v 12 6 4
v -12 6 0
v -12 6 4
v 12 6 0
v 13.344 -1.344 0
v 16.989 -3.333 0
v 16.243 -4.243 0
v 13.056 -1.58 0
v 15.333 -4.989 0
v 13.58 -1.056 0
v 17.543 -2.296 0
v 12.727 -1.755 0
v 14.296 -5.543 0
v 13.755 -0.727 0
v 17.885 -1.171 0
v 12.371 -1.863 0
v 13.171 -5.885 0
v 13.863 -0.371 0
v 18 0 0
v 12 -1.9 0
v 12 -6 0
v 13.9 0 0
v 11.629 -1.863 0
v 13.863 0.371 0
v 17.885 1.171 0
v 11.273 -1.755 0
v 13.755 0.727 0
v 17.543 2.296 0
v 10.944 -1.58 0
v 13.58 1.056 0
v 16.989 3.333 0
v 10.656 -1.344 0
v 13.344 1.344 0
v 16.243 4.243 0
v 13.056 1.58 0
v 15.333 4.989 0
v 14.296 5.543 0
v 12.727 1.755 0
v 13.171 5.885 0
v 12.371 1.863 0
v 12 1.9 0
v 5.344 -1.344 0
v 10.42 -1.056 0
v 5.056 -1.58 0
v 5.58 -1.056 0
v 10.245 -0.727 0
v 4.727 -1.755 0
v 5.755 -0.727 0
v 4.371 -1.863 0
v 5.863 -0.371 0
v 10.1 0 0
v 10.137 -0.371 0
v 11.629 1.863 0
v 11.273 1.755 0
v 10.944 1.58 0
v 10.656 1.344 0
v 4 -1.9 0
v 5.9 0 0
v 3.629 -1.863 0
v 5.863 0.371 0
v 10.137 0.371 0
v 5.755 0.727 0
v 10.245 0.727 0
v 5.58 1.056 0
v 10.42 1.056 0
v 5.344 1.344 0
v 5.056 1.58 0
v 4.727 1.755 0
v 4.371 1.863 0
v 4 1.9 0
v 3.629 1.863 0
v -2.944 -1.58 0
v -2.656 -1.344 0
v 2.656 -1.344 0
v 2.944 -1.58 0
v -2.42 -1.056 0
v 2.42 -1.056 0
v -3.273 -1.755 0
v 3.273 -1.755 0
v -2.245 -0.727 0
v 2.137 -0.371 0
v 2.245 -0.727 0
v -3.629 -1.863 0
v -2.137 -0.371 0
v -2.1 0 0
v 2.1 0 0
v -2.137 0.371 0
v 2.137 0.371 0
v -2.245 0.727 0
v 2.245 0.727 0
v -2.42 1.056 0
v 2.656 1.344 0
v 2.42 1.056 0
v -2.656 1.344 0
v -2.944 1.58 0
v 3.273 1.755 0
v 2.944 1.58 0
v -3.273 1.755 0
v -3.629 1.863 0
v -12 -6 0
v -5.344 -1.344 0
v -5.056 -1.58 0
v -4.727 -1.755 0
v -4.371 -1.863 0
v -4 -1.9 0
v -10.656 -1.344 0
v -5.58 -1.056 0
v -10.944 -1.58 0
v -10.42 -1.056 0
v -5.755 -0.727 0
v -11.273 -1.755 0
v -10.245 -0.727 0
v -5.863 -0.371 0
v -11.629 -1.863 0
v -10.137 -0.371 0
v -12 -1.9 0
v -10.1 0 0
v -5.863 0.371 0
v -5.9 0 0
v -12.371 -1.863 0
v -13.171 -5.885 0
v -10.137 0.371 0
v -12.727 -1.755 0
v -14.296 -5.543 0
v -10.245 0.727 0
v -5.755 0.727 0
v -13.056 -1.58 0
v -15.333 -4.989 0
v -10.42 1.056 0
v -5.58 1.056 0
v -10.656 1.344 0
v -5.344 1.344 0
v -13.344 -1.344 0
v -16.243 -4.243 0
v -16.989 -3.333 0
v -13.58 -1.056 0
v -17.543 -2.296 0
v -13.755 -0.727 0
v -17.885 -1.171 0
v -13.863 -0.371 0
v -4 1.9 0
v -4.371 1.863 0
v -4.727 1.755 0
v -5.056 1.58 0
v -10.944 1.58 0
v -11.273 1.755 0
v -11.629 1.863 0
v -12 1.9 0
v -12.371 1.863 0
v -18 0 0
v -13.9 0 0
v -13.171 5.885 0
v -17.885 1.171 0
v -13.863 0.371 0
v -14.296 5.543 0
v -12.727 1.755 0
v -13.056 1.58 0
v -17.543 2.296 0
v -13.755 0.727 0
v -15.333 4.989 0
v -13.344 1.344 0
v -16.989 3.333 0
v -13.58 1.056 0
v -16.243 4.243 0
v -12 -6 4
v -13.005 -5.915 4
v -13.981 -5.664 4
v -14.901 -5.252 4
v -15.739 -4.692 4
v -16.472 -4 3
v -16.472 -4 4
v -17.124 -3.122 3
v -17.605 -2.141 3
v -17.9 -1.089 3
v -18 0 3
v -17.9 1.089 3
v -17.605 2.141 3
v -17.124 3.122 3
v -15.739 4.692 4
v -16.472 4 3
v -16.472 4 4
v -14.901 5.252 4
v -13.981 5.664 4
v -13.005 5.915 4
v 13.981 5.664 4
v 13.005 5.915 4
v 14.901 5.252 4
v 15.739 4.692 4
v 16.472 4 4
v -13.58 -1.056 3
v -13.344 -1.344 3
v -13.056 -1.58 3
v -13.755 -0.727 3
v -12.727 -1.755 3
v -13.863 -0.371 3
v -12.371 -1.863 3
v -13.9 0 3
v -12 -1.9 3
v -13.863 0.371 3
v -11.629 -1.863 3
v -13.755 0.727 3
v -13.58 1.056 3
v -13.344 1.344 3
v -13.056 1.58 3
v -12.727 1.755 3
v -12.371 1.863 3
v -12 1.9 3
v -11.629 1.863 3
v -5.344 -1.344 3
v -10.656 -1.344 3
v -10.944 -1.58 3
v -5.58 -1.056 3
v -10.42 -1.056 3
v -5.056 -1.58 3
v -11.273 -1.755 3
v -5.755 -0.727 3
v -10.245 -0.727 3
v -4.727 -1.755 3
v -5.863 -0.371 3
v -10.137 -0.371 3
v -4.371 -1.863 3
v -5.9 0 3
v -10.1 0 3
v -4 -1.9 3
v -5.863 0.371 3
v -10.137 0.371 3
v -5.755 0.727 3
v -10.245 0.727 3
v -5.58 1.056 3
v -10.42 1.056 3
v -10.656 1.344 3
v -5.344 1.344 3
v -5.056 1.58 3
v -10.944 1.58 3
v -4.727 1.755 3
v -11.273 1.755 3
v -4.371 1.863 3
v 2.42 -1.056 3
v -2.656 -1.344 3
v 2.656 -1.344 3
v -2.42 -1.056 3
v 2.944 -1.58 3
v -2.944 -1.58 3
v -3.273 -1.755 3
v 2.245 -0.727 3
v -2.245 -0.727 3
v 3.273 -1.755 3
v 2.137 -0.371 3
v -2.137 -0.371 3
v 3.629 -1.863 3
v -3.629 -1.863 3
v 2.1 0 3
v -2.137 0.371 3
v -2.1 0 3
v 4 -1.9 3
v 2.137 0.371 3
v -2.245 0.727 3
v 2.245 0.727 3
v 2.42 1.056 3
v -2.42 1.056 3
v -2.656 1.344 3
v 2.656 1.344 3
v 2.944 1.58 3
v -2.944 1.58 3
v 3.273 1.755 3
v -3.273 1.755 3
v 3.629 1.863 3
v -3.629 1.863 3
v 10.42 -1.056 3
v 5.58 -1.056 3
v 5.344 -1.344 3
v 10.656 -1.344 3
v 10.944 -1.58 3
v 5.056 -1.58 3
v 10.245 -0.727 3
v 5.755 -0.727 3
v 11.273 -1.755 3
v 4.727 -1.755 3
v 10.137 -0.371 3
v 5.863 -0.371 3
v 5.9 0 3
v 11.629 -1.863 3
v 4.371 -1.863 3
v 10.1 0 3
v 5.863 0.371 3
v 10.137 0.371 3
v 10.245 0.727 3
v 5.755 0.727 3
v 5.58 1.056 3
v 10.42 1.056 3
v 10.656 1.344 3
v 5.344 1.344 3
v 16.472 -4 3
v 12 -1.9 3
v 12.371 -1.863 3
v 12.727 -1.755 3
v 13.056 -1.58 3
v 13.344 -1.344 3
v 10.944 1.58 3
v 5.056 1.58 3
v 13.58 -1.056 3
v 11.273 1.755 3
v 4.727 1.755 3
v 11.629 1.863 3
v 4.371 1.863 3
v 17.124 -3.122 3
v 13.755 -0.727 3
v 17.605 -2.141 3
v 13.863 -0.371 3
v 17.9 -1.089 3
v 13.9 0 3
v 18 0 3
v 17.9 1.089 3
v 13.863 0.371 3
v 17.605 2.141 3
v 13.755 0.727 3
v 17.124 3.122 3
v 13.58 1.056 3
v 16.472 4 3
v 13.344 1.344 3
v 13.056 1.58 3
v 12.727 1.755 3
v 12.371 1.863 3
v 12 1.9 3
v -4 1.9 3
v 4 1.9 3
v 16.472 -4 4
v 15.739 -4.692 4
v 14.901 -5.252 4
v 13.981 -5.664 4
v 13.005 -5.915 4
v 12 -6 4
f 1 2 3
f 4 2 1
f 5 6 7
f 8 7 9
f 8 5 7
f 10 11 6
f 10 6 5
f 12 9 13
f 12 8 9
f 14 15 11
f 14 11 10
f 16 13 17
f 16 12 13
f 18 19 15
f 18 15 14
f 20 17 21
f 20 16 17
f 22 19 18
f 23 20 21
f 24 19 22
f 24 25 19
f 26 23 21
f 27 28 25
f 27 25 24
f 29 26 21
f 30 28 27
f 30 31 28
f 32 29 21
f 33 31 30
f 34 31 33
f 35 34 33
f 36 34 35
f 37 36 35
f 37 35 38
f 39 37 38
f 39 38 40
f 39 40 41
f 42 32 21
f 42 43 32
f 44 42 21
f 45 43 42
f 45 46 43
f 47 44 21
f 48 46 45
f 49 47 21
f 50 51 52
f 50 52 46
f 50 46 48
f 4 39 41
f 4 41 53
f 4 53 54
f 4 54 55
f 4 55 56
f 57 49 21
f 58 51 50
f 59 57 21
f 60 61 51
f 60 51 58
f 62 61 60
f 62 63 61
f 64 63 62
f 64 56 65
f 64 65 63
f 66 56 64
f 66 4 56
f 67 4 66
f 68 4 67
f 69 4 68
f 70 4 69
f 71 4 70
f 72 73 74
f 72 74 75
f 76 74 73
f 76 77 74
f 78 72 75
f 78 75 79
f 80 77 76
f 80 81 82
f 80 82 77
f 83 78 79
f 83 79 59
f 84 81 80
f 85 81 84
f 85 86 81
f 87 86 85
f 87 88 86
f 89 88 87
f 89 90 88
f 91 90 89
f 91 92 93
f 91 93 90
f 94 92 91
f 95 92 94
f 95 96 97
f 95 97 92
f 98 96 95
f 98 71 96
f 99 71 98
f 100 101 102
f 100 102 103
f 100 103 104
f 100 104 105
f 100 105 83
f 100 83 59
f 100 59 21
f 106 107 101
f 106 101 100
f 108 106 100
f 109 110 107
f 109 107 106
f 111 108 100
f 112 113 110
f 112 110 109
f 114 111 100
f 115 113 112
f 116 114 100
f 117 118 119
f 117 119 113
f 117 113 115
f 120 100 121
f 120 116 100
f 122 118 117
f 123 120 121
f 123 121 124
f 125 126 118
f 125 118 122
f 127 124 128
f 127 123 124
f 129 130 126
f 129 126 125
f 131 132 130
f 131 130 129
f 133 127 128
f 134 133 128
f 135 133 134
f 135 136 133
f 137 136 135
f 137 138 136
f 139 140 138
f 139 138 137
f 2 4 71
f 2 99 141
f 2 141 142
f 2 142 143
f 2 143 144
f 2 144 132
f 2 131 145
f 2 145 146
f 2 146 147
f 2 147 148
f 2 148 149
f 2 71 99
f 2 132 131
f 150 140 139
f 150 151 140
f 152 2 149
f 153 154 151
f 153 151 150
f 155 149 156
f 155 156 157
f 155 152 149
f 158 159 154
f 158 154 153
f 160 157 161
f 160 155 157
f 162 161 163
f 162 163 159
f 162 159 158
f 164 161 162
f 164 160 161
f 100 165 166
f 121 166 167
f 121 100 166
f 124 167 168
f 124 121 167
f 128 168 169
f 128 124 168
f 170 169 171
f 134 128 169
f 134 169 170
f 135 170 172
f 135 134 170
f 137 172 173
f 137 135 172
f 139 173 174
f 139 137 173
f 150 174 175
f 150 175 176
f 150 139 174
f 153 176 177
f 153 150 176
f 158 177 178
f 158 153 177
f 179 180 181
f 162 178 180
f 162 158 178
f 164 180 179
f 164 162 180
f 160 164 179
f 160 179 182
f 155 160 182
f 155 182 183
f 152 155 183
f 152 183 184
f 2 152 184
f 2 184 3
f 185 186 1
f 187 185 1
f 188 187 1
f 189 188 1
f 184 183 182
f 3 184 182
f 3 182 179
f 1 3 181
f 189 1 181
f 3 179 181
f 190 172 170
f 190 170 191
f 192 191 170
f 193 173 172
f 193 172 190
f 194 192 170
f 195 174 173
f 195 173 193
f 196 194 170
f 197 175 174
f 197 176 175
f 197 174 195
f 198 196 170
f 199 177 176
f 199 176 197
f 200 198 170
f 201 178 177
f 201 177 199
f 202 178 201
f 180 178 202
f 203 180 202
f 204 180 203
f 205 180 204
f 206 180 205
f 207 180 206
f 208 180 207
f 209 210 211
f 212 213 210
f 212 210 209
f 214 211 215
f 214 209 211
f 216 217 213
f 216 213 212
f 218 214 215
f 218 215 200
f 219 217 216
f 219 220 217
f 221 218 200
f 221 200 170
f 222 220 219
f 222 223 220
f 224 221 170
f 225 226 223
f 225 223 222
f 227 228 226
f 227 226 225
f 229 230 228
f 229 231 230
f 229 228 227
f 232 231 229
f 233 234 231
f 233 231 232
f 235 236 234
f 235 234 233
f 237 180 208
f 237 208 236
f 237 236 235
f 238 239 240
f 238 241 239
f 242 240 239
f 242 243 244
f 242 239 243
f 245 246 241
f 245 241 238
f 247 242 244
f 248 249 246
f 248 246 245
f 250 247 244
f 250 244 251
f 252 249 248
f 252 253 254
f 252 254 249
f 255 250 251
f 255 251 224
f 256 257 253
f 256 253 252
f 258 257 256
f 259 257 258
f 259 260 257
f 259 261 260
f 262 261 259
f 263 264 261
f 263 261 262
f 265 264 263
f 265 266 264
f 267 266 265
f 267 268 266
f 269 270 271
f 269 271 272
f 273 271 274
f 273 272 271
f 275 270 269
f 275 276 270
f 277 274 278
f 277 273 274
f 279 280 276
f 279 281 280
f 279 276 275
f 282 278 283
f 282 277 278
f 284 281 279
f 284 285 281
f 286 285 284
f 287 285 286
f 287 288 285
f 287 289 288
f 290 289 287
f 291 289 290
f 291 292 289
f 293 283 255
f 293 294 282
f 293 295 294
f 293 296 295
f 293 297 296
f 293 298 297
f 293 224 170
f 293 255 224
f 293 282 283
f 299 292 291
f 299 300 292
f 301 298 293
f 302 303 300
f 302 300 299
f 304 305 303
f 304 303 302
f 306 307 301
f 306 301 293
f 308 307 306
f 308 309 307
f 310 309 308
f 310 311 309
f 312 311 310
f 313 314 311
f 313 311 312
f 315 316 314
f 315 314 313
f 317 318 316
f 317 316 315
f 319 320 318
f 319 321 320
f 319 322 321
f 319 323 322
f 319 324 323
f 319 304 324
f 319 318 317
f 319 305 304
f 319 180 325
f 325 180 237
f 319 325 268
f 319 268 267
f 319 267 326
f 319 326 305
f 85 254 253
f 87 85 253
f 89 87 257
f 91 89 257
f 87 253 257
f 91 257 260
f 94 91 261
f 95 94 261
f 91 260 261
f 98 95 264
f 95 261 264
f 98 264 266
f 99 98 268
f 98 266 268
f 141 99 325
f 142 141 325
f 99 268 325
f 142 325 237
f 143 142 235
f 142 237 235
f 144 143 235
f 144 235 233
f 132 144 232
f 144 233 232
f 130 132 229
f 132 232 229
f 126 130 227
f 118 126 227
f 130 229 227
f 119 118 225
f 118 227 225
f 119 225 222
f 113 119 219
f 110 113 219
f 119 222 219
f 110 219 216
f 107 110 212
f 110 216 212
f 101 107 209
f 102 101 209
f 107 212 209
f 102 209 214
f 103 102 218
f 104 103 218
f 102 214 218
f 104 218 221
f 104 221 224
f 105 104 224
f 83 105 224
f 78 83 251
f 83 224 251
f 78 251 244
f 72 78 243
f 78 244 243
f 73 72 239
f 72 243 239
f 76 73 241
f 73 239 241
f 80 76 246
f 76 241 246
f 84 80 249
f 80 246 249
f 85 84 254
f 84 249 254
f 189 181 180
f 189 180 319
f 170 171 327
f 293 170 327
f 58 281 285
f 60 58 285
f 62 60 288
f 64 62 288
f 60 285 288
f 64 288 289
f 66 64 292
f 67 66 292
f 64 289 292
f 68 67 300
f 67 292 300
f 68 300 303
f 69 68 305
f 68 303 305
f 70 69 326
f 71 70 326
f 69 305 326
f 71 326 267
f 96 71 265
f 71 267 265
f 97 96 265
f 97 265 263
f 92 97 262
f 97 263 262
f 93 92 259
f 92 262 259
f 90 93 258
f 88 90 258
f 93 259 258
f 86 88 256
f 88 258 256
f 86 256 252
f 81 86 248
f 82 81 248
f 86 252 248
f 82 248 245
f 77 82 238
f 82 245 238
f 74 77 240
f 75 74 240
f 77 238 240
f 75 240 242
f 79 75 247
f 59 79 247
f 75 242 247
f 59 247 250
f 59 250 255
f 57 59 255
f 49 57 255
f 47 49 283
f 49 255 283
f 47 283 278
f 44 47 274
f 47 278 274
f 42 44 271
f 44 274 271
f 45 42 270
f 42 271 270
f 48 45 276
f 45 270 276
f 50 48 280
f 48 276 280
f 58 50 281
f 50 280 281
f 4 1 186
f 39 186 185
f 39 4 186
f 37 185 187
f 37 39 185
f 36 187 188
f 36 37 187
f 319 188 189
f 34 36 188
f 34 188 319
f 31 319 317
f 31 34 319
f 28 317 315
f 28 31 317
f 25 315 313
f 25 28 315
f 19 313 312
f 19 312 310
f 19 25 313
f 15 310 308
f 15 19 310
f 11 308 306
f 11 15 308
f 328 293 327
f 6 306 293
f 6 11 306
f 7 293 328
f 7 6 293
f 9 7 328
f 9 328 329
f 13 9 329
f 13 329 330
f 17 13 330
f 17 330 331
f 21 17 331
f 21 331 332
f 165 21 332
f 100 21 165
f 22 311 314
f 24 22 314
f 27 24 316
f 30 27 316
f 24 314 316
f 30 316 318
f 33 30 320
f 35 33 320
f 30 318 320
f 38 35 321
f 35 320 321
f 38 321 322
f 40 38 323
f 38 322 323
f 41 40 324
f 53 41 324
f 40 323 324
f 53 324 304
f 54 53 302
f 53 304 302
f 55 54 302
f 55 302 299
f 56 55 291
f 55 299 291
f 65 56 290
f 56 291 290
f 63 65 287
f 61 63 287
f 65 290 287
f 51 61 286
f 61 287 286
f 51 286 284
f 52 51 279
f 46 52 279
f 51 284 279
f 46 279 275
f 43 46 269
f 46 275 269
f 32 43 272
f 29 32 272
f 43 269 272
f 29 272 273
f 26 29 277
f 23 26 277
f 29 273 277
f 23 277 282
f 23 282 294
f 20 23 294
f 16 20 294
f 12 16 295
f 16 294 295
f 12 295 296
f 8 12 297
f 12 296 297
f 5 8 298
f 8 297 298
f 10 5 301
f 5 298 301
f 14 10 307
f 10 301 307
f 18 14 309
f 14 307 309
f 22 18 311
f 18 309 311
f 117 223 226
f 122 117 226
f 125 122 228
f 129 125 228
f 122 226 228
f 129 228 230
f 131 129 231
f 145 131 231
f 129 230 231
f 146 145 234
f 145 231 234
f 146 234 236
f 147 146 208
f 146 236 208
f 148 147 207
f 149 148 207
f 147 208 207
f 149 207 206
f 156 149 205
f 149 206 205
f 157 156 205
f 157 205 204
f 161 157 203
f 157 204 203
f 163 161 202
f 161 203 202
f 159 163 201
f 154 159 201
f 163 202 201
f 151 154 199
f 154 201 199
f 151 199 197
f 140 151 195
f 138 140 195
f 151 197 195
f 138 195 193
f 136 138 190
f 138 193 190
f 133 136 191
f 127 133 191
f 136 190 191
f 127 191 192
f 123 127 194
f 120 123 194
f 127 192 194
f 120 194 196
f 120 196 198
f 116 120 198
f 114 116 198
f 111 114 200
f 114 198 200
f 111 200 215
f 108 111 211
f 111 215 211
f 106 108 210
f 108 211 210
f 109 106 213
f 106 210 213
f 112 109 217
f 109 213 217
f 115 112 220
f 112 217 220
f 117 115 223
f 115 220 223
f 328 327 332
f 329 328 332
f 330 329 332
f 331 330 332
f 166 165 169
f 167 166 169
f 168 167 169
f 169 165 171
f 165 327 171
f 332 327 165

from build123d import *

# Parameters (mm, degrees)
EXTRUDE_1_DEPTH        = 4
SKETCH_2_W             = 36
SKETCH_2_H             = 8
CUT_EXTRUDE_1_DEPTH    = 1
SKETCH_3_R             = 1.9
CUT_EXTRUDE_2_DEPTH    = 3
PATTERN_LINEAR_1_COUNT = 5
PATTERN_LINEAR_1_PITCH = 8


with BuildPart() as part:
    # 草图1 → 凸台-拉伸1 (new body)
    with BuildSketch(Plane.XY):
        with BuildLine():
            Line((-12, 6), (12, 6))
            ThreePointArc((12, 6), (18, 0), (12, -6))
            Line((12, -6), (-12, -6))
            ThreePointArc((-12, -6), (-18, 0), (-12, 6))
        make_face()
    extrude(amount=EXTRUDE_1_DEPTH)

    # 草图2 → 切除-拉伸1 (cut)
    with BuildSketch(Plane.XY.offset(4)):
        Rectangle(SKETCH_2_W, SKETCH_2_H)
    extrude(amount=-CUT_EXTRUDE_1_DEPTH, mode=Mode.SUBTRACT)

    # 草图3 → 切除-拉伸2 (cut)
    with BuildSketch(Plane.XY.offset(3)):
        with Locations((-12, 0)):
            Circle(SKETCH_3_R)
    cut_extrude_2 = extrude(amount=-CUT_EXTRUDE_2_DEPTH, mode=Mode.SUBTRACT)

    # 阵列(线性)1: 切除-拉伸2 ×5
    with Locations(*[(i * PATTERN_LINEAR_1_PITCH, 0, 0) for i in range(1, PATTERN_LINEAR_1_COUNT)]):
        add(cut_extrude_2, mode=Mode.SUBTRACT)


solid = part.part
